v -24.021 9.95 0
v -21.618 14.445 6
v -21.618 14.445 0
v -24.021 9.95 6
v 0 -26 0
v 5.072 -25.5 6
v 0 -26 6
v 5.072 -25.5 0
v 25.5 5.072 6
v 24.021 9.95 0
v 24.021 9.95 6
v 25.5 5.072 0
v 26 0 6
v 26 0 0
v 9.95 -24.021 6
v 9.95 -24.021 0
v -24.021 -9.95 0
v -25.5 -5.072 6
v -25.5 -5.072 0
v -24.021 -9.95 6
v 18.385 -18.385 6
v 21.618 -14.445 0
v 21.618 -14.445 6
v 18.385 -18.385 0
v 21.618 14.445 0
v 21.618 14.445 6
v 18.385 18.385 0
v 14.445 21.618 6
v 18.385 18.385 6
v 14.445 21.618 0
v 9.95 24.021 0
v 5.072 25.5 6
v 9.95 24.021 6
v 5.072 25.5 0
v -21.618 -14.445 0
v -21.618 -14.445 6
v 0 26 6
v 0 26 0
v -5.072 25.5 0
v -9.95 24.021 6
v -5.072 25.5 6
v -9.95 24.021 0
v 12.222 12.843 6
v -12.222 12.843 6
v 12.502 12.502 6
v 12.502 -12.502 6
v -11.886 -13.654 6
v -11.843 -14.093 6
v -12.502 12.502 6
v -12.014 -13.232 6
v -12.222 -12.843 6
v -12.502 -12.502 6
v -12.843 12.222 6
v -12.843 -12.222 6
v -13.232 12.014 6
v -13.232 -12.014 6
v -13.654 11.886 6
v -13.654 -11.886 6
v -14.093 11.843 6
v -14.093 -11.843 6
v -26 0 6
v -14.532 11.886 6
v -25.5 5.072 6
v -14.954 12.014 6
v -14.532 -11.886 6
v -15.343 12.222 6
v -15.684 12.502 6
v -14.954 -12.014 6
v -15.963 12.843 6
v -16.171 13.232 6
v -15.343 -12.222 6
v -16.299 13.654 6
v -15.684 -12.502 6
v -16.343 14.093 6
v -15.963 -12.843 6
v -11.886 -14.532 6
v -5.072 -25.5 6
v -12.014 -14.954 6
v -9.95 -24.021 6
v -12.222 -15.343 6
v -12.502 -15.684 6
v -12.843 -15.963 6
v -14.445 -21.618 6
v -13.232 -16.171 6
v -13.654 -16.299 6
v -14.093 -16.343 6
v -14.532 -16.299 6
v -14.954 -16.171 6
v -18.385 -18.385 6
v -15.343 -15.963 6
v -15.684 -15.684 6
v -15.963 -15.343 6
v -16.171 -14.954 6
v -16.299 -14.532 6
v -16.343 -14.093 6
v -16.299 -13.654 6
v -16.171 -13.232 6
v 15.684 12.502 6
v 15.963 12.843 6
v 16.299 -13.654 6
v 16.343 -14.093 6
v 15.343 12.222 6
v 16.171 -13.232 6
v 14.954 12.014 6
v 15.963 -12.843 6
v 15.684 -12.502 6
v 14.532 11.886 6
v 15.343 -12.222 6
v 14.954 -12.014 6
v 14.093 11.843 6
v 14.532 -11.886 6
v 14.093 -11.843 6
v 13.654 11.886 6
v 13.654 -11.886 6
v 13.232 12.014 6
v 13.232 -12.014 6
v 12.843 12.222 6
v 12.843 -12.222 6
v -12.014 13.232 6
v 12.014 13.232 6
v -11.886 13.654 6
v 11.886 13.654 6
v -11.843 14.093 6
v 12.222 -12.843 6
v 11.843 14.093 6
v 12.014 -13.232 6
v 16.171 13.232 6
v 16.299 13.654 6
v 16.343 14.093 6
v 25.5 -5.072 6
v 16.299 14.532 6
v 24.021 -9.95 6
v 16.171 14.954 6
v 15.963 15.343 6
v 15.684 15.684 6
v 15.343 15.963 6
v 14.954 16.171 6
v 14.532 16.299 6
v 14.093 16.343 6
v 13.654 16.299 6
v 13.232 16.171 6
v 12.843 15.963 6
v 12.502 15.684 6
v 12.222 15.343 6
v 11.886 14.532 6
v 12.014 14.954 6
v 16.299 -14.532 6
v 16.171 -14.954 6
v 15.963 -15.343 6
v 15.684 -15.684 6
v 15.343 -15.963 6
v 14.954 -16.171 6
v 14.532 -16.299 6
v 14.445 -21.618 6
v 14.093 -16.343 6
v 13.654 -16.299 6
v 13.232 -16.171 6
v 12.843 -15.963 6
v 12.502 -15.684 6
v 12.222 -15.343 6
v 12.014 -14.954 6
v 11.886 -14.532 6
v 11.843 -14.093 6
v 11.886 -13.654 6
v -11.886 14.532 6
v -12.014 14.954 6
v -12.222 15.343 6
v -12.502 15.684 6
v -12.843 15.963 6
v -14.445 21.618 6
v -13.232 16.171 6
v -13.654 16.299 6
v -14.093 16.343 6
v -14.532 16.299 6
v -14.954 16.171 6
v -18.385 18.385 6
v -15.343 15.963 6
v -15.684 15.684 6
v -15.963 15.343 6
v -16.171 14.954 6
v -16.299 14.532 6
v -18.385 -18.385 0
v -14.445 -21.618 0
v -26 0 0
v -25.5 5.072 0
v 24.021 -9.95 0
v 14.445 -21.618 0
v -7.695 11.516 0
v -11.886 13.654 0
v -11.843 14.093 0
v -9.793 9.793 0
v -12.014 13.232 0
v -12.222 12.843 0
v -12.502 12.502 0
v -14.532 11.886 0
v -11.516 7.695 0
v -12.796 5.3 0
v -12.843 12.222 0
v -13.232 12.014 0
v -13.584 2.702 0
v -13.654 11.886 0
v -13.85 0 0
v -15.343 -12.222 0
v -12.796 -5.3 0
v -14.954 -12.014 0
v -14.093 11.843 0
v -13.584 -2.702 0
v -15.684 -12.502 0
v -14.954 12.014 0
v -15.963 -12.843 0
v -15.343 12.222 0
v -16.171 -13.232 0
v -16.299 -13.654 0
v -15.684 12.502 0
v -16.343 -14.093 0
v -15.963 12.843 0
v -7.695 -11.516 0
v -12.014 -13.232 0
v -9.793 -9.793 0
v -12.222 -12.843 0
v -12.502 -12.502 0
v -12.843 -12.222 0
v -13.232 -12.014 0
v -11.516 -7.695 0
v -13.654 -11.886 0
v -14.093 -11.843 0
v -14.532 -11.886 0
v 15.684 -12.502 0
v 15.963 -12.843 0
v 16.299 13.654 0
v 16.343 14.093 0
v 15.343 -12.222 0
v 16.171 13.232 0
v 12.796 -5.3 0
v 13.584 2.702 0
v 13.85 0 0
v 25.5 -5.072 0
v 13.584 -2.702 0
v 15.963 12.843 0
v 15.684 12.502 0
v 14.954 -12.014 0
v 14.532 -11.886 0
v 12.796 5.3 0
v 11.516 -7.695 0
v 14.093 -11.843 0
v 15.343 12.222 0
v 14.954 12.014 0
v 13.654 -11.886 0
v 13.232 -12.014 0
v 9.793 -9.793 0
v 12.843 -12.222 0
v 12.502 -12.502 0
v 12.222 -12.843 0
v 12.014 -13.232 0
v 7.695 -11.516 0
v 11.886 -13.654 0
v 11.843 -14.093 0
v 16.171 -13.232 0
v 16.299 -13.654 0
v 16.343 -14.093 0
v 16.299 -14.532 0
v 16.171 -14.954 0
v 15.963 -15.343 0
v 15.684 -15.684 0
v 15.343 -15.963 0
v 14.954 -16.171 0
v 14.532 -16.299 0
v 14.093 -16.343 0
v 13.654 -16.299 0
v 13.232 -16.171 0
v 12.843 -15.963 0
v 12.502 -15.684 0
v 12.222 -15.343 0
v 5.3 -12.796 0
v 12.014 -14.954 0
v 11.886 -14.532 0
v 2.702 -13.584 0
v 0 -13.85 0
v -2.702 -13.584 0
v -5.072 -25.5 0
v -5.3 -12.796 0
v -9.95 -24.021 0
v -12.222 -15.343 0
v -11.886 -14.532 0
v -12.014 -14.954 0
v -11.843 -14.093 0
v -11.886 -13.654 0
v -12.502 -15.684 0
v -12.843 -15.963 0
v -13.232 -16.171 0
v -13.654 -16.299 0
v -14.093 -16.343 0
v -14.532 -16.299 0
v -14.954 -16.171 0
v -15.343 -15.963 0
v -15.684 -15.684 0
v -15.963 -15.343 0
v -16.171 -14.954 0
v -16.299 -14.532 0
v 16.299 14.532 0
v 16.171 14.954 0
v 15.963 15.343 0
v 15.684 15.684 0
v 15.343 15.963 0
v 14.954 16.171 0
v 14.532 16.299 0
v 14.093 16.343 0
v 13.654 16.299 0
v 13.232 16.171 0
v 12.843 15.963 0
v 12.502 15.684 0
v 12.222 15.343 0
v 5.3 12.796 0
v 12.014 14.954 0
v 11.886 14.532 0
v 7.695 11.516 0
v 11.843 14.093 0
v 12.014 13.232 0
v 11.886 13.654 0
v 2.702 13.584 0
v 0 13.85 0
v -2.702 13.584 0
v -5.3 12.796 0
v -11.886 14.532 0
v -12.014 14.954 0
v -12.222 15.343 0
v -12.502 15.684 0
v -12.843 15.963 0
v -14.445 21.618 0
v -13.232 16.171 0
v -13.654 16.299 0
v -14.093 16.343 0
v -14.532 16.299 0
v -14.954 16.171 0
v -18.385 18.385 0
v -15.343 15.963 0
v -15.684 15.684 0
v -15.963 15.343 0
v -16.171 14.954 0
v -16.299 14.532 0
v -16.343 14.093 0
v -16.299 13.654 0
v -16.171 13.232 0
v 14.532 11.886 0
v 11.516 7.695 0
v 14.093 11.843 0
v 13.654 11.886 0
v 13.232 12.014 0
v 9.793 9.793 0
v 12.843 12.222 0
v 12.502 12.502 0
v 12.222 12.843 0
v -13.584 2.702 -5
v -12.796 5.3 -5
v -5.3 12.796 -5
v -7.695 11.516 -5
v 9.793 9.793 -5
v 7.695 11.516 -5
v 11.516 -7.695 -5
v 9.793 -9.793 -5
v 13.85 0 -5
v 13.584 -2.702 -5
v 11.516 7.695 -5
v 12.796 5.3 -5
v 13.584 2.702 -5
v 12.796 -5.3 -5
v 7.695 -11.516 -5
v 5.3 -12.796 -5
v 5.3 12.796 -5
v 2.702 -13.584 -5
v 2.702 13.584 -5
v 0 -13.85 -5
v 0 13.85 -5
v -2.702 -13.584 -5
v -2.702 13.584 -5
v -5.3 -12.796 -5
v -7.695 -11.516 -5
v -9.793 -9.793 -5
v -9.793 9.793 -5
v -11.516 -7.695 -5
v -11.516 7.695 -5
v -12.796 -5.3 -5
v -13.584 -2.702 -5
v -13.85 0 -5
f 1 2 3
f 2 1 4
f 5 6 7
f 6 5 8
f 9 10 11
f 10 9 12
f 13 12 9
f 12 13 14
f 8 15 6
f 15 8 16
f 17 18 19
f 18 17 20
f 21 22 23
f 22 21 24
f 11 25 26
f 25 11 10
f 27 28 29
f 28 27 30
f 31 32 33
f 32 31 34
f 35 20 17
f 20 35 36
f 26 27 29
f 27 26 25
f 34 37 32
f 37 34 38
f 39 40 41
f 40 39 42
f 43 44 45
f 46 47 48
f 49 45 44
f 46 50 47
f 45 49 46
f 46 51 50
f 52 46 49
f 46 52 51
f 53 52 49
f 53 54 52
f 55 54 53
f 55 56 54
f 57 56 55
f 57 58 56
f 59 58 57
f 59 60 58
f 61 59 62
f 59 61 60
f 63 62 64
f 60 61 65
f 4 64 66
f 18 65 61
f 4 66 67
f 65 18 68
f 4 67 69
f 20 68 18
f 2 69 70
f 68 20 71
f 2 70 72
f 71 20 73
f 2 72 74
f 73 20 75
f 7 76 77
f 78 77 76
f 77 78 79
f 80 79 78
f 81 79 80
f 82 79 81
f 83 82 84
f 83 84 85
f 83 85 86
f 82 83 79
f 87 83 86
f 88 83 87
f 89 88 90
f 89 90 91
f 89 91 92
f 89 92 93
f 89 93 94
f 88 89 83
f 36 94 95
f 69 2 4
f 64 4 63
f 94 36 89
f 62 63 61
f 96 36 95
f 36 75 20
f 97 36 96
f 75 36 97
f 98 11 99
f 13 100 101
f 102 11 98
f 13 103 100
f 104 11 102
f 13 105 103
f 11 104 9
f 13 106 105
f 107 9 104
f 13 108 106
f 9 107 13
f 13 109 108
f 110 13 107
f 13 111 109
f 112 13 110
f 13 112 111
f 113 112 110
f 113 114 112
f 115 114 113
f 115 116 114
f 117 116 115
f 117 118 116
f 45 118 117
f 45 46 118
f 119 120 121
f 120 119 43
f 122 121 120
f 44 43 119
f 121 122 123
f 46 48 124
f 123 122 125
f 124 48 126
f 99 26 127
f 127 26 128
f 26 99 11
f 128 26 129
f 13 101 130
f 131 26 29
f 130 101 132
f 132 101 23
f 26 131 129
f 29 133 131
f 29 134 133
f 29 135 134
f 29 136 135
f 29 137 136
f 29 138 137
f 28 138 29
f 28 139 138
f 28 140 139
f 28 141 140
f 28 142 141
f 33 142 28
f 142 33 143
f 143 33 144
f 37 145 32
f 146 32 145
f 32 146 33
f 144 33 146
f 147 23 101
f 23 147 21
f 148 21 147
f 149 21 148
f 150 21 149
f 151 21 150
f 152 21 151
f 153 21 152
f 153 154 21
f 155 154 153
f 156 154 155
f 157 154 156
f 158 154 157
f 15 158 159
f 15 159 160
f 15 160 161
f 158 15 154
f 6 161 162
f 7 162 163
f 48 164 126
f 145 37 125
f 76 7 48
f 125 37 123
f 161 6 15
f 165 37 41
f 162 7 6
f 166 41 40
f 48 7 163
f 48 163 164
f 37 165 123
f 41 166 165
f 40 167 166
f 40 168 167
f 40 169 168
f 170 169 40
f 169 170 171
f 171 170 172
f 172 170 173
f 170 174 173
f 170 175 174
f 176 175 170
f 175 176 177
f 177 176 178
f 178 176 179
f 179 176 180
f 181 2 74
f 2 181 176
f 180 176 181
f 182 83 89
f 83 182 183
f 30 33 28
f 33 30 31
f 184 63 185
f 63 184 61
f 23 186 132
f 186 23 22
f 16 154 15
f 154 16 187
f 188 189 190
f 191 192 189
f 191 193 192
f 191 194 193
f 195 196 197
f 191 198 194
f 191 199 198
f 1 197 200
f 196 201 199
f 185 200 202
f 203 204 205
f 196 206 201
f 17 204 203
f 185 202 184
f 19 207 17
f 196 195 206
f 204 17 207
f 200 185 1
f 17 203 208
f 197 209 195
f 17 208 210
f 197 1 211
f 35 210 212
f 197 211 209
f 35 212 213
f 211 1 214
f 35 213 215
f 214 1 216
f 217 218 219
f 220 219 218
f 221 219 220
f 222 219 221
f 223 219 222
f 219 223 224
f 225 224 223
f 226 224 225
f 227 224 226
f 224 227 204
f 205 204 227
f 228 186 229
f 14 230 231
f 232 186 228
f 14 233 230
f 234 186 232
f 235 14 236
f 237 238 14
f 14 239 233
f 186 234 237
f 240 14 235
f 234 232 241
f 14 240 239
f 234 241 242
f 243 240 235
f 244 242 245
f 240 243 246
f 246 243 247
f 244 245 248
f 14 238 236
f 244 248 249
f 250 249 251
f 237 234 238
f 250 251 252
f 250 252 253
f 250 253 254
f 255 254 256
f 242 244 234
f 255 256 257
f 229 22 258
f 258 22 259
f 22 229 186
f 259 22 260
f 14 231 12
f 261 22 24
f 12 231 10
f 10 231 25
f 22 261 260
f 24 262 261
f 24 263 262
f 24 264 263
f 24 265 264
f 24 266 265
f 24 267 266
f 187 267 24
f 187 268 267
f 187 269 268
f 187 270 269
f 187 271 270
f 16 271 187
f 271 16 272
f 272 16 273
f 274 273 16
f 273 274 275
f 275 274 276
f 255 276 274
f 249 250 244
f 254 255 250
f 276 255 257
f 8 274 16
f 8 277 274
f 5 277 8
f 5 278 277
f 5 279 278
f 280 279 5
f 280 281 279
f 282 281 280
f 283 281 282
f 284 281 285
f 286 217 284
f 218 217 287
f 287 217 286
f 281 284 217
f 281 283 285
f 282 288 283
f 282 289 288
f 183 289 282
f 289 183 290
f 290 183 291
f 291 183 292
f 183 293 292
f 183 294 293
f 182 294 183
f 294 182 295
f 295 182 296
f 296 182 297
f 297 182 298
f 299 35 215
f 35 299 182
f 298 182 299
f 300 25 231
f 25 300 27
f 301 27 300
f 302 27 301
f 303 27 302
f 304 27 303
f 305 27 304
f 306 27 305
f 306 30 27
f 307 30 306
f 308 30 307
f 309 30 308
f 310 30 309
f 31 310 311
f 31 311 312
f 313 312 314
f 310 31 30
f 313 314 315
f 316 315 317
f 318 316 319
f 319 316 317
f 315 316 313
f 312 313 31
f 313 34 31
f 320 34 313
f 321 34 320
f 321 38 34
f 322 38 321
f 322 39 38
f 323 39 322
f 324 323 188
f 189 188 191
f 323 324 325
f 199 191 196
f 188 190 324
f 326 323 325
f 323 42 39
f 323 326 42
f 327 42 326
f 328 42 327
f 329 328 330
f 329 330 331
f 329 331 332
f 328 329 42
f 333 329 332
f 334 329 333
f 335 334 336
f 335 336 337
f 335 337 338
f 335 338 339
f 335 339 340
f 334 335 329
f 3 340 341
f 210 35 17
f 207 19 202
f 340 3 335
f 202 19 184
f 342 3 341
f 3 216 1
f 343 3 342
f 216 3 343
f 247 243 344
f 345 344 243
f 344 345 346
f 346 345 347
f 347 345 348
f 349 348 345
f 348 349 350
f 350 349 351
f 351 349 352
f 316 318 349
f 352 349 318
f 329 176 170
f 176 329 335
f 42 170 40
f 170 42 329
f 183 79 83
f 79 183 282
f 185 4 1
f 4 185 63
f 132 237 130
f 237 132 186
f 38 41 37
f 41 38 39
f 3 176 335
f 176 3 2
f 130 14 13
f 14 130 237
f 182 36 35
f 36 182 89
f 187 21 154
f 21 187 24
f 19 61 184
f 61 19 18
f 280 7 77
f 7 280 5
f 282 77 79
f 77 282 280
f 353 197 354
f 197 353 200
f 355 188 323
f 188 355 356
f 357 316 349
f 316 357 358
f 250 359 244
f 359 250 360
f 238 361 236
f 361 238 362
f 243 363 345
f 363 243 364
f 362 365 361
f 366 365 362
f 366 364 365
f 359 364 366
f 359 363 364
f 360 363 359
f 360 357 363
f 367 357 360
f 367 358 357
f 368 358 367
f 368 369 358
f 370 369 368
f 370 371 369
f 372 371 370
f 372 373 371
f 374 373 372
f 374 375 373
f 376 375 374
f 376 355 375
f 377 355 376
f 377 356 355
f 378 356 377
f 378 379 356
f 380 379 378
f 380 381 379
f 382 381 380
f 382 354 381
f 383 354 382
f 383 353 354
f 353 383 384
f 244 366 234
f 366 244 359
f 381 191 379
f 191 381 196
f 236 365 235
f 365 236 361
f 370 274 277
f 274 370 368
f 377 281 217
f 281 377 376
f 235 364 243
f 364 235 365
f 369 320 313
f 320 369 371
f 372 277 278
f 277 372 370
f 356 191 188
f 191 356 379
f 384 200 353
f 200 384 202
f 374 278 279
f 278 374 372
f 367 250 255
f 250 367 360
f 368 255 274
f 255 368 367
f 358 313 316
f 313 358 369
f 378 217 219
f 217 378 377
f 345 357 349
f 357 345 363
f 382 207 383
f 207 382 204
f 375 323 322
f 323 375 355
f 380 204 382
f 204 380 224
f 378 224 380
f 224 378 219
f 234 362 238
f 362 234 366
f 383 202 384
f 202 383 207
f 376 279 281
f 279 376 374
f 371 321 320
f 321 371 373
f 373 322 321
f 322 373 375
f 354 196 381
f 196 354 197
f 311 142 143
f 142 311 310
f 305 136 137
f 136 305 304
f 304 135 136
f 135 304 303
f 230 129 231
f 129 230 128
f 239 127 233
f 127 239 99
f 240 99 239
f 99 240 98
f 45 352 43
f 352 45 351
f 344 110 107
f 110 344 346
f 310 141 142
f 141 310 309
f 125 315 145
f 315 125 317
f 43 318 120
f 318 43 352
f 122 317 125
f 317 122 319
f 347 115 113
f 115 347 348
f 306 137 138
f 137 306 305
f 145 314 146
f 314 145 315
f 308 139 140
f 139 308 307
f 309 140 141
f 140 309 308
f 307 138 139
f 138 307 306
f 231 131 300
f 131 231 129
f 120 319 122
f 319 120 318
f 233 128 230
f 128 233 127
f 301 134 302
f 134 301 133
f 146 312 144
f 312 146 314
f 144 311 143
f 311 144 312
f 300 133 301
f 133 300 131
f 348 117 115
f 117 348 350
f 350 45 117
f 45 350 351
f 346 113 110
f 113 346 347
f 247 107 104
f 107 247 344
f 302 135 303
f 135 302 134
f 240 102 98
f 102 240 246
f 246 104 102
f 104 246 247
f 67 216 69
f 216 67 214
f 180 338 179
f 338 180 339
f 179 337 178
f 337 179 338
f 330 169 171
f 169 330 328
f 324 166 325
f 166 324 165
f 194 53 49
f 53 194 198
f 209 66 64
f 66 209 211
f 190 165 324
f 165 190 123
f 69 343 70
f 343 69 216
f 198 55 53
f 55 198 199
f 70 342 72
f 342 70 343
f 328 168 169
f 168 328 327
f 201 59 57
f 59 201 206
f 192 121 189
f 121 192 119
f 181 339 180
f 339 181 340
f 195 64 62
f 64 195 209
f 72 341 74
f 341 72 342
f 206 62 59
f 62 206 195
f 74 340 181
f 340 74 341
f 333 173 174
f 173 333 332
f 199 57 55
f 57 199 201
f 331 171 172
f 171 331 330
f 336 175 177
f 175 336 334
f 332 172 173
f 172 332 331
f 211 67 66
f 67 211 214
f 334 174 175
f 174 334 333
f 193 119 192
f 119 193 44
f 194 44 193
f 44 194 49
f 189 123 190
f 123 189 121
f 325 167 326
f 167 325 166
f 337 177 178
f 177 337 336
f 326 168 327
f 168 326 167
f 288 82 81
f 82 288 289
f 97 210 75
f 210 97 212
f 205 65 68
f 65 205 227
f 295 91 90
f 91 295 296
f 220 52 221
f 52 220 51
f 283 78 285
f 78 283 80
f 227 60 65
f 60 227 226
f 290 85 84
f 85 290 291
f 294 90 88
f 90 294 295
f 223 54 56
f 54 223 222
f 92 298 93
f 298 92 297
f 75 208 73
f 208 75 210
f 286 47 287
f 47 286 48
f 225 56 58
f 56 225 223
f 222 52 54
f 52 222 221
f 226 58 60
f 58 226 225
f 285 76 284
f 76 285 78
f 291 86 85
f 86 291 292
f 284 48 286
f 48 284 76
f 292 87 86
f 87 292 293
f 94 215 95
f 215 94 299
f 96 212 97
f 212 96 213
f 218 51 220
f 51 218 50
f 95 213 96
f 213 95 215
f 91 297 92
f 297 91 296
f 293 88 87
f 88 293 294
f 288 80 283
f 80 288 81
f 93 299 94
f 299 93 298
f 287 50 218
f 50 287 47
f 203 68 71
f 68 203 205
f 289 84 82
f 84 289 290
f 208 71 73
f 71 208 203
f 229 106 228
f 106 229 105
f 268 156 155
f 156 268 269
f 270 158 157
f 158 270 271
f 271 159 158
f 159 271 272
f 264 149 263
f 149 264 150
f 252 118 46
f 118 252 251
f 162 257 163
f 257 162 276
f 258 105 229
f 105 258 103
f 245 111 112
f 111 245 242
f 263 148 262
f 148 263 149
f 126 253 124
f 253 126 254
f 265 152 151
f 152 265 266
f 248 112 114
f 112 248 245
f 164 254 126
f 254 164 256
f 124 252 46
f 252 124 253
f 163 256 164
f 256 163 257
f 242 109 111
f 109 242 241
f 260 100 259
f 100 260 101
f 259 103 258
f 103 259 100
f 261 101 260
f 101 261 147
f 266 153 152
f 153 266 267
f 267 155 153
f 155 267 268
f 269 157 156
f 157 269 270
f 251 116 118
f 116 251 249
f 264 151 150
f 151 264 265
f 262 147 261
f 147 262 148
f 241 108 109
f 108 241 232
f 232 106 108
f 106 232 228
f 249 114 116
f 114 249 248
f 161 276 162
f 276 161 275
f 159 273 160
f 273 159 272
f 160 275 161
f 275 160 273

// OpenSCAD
$fn = 32;

// ----------------------------------------------------------------------
// Retaining cap: 6001 cover, 52 mm, spigot 27.7 mm
// ----------------------------------------------------------------------

// --- parameters (mm) ---
cap_d = 52;               // cover diameter
cap_t = 6;                // cover thickness
lip_d = 27.7;             // spigot that enters the housing
lip_h = 5;                // spigot height
bolt_d = 4.5;             // bolt clearance
bolt_r = 19.93;           // bolt circle radius

module cover() {
  cylinder(h = cap_t, d = cap_d);
}

module spigot() {
  /* sunk 1 mm into the cover; the spigot sets the overall height */
  translate([0, 0, -lip_h]) cylinder(h = lip_h + 1, d = lip_d);
}

difference() {
  union() {
    cover();
    spigot();
  }
  for (i = [0 : 3]) rotate([0, 0, 45 + i * 90]) translate([bolt_r, 0, -lip_h - 1])
    cylinder(h = lip_h + cap_t + 2, d = bolt_d);
}
